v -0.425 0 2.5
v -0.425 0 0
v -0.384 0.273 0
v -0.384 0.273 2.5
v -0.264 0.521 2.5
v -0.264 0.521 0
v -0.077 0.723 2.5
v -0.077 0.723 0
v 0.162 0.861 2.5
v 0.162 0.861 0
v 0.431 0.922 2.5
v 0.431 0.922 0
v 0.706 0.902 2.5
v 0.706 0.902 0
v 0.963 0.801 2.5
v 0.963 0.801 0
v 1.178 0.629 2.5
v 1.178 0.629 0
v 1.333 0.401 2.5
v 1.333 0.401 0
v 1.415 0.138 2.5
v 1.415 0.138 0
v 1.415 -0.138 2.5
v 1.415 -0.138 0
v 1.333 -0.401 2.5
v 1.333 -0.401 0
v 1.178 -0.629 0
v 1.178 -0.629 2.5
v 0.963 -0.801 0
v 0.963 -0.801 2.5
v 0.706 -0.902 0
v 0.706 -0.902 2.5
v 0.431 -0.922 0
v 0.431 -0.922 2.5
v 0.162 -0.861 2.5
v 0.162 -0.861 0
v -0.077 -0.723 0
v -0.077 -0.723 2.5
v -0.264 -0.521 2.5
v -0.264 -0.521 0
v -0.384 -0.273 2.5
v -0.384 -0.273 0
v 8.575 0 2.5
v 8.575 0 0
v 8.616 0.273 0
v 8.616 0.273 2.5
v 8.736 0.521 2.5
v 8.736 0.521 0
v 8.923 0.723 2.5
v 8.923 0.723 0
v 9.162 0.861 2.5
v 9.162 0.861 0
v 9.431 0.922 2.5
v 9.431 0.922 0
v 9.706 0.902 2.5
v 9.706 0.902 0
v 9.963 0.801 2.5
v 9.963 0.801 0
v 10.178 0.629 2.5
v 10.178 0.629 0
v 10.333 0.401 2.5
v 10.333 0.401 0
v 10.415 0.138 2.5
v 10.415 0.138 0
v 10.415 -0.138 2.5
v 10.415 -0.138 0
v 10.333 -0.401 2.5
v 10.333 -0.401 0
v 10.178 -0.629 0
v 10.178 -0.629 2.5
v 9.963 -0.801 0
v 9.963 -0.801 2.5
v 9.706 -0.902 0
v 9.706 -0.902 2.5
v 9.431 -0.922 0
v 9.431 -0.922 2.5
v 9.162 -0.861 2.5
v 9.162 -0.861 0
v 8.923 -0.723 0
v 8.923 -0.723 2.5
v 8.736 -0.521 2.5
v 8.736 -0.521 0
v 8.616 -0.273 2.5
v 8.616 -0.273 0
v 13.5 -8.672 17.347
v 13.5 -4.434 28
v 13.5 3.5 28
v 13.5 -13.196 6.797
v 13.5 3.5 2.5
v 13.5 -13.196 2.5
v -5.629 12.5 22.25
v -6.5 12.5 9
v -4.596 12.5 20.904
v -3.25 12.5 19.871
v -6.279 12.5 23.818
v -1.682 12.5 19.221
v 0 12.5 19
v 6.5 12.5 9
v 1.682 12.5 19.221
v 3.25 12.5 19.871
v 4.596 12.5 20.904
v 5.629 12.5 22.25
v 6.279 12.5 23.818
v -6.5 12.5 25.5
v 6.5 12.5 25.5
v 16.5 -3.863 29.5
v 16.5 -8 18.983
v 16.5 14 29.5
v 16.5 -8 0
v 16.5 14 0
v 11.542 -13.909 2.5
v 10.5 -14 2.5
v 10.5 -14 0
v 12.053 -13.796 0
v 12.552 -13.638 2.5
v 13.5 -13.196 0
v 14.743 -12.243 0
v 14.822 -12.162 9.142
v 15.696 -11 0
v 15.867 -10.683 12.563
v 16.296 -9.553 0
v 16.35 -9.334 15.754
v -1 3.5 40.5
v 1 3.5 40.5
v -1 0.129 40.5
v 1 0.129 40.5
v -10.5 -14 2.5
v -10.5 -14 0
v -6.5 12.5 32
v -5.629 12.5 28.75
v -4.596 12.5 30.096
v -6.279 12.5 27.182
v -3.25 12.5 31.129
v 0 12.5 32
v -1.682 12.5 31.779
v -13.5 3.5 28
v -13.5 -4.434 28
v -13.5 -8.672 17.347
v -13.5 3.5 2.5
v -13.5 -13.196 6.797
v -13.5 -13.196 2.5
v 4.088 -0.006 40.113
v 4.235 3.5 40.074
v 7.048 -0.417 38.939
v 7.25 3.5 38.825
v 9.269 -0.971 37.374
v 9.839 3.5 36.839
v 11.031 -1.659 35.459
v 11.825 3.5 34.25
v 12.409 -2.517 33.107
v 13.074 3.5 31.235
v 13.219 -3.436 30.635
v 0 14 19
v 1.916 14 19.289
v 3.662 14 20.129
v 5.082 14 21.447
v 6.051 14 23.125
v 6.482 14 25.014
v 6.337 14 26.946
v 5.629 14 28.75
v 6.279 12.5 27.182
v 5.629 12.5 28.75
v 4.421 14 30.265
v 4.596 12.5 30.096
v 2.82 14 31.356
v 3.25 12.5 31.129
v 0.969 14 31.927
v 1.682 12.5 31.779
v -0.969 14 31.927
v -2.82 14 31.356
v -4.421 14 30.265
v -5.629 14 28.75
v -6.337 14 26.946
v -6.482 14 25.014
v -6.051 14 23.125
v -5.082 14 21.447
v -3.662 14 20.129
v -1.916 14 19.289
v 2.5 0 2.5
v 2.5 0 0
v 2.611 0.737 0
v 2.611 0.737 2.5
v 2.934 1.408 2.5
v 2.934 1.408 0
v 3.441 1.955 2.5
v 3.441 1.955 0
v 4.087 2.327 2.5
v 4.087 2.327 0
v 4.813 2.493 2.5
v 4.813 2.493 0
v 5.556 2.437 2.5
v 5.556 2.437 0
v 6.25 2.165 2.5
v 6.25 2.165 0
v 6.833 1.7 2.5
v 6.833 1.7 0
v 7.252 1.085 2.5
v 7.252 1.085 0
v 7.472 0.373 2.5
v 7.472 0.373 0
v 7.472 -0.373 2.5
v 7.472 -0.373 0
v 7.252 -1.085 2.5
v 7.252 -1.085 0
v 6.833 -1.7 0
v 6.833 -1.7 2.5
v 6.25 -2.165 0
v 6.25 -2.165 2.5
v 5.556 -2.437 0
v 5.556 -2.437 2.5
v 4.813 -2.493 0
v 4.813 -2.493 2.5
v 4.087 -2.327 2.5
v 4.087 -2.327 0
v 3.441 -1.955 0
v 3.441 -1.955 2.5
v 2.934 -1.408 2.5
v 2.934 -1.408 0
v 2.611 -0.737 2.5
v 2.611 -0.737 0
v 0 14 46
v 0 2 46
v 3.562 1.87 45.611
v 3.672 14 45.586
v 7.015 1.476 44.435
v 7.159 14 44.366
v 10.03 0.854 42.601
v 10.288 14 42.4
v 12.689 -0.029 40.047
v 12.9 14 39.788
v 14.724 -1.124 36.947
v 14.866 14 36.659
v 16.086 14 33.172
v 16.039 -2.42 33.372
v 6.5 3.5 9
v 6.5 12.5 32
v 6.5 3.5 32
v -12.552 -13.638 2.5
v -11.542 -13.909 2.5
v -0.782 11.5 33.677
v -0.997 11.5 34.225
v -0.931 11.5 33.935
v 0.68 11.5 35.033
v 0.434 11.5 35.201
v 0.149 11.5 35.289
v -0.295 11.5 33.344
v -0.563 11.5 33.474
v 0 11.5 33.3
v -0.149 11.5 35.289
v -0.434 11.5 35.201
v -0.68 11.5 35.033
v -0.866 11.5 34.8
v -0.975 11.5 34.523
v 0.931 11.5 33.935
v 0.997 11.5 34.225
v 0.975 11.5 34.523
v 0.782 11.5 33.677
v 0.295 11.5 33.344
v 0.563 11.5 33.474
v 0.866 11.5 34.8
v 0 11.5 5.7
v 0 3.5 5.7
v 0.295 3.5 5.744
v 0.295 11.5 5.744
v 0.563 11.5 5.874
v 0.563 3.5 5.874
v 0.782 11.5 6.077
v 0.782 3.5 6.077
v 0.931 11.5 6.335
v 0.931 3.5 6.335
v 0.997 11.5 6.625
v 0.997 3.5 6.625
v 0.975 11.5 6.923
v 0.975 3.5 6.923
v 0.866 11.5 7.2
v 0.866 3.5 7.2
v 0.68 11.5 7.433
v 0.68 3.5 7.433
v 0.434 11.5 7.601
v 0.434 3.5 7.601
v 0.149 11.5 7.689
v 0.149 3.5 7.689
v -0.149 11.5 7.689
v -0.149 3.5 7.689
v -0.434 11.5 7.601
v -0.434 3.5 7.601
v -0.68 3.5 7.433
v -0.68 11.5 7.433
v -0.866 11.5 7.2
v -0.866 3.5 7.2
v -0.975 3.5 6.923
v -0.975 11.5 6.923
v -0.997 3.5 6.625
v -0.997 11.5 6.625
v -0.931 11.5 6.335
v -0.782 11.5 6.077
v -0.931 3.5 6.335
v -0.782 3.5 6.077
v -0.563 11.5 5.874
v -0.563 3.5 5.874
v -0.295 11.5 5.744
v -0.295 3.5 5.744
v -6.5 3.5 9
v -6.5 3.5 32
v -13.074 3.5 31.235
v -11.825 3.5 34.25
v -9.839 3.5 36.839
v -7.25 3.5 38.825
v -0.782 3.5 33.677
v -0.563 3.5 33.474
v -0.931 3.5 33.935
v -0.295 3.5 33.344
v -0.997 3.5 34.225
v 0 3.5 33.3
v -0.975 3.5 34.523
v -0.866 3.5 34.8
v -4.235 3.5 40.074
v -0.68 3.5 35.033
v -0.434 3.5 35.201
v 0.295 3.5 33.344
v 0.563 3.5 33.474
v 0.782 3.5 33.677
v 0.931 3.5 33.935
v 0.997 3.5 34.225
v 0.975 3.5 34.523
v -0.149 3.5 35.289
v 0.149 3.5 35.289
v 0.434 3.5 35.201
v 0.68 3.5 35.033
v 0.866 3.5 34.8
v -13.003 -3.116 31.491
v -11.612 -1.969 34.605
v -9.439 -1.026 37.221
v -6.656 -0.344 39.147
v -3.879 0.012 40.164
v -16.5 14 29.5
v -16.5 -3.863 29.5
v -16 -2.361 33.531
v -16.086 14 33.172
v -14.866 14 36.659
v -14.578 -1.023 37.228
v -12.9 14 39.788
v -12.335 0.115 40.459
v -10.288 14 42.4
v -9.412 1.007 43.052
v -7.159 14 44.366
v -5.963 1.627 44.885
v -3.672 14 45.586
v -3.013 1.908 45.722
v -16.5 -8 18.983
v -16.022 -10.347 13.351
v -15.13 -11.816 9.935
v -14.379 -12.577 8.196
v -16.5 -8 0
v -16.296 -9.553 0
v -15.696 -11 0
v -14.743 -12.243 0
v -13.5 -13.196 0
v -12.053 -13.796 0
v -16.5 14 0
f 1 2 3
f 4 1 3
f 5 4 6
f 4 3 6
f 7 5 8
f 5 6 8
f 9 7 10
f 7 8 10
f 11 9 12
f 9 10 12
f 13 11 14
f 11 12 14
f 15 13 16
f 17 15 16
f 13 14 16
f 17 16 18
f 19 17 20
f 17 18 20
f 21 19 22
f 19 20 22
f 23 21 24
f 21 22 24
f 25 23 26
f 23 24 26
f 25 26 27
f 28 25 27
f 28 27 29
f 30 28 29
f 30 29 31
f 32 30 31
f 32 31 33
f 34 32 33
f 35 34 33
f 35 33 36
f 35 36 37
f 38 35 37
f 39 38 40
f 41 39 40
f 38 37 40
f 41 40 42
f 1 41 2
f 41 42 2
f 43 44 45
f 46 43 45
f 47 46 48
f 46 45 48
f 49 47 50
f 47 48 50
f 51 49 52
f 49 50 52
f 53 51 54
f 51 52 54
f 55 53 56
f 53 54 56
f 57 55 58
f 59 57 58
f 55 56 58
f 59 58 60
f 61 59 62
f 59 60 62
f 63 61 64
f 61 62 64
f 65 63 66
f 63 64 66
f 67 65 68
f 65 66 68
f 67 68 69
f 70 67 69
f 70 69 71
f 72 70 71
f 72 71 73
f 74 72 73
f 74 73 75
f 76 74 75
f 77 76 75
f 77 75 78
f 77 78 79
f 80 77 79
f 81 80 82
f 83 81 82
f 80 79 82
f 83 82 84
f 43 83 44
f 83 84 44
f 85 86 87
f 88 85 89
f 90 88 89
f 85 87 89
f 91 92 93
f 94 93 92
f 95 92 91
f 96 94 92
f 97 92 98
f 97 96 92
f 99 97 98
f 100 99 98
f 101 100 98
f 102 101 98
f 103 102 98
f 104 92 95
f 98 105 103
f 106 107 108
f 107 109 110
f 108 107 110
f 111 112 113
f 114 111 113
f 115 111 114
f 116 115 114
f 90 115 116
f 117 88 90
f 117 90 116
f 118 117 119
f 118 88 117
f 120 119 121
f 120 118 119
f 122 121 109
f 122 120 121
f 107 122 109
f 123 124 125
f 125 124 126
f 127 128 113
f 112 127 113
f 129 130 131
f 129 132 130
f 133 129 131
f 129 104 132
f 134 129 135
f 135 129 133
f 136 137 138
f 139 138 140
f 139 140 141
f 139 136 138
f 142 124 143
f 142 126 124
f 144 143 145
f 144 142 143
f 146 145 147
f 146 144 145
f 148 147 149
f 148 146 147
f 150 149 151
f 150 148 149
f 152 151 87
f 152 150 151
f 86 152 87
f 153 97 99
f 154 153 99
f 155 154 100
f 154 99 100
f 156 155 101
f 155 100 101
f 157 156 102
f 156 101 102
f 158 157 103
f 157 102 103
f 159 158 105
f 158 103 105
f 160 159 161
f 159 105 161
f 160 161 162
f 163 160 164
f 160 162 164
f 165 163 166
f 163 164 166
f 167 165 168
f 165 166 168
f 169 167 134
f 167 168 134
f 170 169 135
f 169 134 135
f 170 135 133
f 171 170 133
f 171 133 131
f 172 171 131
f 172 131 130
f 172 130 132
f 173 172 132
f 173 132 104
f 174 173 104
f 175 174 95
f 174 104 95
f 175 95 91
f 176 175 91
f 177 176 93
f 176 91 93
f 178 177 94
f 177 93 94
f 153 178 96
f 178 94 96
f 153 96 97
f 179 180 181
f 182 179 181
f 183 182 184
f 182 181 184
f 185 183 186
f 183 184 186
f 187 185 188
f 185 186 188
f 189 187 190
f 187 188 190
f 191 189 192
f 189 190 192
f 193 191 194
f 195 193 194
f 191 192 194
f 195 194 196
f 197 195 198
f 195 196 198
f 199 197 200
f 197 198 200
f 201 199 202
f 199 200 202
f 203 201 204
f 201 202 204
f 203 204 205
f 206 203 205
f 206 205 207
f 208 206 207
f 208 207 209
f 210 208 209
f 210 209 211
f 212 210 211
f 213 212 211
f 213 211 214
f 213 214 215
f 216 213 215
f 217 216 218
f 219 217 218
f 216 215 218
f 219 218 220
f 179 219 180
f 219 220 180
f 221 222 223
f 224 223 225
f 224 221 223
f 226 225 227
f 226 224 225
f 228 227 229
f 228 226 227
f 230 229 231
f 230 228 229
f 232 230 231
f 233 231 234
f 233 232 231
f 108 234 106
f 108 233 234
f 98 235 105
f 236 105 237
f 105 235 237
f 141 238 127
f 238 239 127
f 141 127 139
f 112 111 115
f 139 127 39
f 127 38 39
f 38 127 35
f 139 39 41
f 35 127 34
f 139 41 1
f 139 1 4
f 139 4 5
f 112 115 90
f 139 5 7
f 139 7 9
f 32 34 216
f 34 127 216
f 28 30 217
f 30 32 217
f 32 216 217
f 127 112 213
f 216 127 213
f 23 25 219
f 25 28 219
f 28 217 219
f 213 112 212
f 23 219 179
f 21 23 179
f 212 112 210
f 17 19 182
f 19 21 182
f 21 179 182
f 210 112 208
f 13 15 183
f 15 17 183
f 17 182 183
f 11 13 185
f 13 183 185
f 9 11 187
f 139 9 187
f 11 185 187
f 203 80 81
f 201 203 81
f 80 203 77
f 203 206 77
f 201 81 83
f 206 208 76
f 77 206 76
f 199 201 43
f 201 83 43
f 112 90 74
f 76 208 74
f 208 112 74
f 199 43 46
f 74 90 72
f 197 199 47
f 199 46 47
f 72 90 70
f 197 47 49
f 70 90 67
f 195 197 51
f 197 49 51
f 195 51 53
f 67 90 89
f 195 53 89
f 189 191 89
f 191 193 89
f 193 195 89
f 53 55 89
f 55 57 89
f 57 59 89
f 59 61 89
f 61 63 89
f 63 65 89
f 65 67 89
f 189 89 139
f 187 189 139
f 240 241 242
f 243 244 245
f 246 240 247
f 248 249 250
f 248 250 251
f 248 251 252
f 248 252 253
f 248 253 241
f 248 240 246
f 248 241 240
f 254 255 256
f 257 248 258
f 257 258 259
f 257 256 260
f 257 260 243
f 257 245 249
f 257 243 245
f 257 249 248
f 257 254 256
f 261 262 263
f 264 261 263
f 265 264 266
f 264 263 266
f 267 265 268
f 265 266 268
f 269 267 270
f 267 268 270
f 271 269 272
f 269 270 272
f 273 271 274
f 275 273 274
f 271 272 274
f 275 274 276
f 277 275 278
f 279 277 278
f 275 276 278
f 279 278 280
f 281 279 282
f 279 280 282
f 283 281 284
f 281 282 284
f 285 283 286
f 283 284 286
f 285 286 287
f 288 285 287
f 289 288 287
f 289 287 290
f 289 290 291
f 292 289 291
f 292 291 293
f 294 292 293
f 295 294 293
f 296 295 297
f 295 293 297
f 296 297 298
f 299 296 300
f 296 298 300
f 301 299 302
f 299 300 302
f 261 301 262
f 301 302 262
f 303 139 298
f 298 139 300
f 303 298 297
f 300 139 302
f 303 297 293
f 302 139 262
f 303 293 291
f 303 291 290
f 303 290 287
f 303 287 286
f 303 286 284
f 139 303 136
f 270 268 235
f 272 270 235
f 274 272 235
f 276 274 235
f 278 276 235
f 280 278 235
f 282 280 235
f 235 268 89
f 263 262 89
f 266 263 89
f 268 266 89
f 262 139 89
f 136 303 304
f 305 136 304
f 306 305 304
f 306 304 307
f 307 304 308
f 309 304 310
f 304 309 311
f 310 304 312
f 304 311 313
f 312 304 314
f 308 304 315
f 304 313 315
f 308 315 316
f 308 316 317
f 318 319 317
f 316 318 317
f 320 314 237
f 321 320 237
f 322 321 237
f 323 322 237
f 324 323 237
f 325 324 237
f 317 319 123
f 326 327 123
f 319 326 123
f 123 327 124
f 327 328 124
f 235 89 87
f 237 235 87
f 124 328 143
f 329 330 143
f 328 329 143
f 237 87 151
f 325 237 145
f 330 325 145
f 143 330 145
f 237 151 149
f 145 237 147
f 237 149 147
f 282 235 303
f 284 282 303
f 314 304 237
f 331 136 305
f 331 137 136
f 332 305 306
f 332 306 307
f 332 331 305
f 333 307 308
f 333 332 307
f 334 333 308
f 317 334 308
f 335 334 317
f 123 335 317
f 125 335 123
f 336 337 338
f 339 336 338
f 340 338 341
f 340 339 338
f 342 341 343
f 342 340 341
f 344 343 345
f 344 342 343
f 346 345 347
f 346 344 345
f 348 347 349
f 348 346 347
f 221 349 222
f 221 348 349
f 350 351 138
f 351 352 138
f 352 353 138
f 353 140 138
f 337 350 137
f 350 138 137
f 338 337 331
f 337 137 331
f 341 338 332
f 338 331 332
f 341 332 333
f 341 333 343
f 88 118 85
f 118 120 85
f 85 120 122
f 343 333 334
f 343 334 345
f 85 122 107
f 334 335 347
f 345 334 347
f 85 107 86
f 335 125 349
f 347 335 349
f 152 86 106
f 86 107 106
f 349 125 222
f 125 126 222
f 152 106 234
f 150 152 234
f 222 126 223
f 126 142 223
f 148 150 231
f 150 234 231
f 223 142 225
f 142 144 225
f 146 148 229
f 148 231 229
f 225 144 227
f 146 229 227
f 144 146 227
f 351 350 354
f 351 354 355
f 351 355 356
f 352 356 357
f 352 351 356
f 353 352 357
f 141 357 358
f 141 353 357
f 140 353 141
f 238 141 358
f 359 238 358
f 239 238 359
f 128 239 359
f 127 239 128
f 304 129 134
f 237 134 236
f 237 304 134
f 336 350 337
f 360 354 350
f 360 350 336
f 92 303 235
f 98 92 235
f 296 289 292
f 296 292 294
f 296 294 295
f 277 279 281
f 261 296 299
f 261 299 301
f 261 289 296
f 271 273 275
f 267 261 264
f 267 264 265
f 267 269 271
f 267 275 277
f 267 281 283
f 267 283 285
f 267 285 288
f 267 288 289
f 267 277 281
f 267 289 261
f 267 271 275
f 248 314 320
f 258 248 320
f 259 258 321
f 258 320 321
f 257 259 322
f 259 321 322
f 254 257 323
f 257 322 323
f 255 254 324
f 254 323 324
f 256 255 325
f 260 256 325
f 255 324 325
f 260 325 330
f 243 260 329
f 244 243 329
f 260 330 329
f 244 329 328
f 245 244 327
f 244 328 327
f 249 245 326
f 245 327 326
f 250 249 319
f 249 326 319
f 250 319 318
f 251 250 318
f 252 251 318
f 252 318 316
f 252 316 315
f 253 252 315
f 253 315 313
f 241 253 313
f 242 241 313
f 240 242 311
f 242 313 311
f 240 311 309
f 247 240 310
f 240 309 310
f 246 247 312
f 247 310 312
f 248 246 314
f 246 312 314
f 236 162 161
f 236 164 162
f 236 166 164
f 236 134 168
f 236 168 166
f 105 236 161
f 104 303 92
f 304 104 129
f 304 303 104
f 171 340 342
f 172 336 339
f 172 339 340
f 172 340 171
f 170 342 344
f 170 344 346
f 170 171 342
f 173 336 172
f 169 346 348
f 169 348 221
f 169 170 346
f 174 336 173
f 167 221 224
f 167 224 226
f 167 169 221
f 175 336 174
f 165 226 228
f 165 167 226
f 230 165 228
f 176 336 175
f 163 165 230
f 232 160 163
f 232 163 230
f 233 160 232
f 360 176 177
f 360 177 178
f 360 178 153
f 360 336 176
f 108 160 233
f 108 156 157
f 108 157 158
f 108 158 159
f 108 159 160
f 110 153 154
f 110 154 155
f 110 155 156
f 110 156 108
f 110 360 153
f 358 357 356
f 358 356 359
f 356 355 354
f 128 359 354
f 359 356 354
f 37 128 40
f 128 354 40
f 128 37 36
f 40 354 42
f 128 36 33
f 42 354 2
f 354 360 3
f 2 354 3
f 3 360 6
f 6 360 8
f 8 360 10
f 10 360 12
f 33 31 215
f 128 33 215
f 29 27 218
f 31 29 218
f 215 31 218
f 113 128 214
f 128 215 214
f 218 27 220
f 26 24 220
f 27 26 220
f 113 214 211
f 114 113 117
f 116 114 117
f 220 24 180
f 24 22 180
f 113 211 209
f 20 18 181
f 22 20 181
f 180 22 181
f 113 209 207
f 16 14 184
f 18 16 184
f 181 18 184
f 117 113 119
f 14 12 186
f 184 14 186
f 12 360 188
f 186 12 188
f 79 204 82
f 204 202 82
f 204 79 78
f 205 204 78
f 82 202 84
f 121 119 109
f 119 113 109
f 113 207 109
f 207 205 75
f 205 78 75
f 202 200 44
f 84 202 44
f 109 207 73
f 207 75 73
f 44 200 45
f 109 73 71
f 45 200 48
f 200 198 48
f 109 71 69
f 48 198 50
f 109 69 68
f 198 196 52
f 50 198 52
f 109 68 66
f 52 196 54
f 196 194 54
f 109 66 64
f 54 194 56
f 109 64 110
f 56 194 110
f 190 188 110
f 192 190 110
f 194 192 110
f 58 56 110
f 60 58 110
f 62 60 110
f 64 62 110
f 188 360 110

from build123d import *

# Parameters (mm, degrees)
SKETCH1_W           = 33
SKETCH1_H           = 28
BOSS_EXTRUDE1_DEPTH = 46
CUT_EXTRUDE1_DEPTH  = 59.318093247
CUT_EXTRUDE4_START  = -3
CUT_EXTRUDE4_DEPTH  = 27
FILLET1_R           = 12.5
FILLET2_R           = 16.5
FILLET3_R           = 6
SKETCH5_W           = 13
SKETCH5_H           = 23
CUT_EXTRUDE8_DEPTH  = 9
SKETCH6_R           = 6.5
CUT_EXTRUDE9_DEPTH  = 56.592265809
SKETCH7_R           = 1
CUT_EXTRUDE10_DEPTH = 8
SKETCH8_R           = 0.925072744
SKETCH8_R_2         = 2.5
CUT_EXTRUDE11_DEPTH = 2.5


with BuildPart() as part:
    # Sketch1 → Boss-Extrude1 (new body)
    with BuildSketch(Plane.XY):
        Rectangle(SKETCH1_W, SKETCH1_H)
    extrude(amount=BOSS_EXTRUDE1_DEPTH)

    # Sketch3 → Cut-Extrude1 (cut, through all)
    with BuildSketch(Plane(origin=(16.5, 0, 0), x_dir=(0, 0, -1), z_dir=(1, 0, 0))):
        with BuildLine():
            Line((-46, 2), (-46, -14))
            Line((-46, -14), (-5, -14))
            add(Edge.make_bspline(
                [(-5, -14), (-25.11965555, -4.947029267), (-46, 2)],
                knots=[0, 0, 0, 1, 1, 1], degree=2))
        make_face()
    extrude(amount=-CUT_EXTRUDE1_DEPTH, mode=Mode.SUBTRACT)

    # Sketch4 → Cut-Extrude4 (cut)
    with BuildSketch(Plane(origin=(16.5, 0, 0), x_dir=(0, 0, -1), z_dir=(1, 0, 0)).offset(CUT_EXTRUDE4_START)):
        with BuildLine():
            Line((-5, -14), (-2.5, -14))
            Line((-2.5, -14), (-2.5, 3.5))
            Line((-2.5, 3.5), (-40.5, 3.5))
            Line((-40.5, 3.5), (-40.5, 0.128997137))
            add(Edge.make_bspline(
                [(-5, -14), (-22.463452761, -6.142205101), (-40.5, 0.128997137)],
                knots=[0, 0, 0, 1, 1, 1], degree=2))
        make_face()
    extrude(amount=-CUT_EXTRUDE4_DEPTH, mode=Mode.SUBTRACT)

    # Fillet1
    fillet1_edges = [part.edges().sort_by_distance(p)[0] for p in [
        (13.5, 1.814498569, 40.5),
        (-13.5, 1.814498569, 40.5),
    ]]
    fillet(fillet1_edges, radius=FILLET1_R)

    # Fillet2
    fillet2_edges = [part.edges().sort_by_distance(p)[0] for p in [
        (-16.5, 8, 46),
        (16.5, 8, 46),
    ]]
    fillet(fillet2_edges, radius=FILLET2_R - 0.0001)  # a hair under: the kernel refuses the full size

    # Fillet3
    fillet3_edges = [part.edges().sort_by_distance(p)[0] for p in [
        (-16.5, -14, 2.5),
        (16.5, -14, 2.5),
    ]]
    fillet(fillet3_edges, radius=FILLET3_R)

    # Sketch5 → Cut-Extrude8 (cut)
    with BuildSketch(Plane.XZ.offset(-3.5)):
        with Locations((0, 20.5)):
            Rectangle(SKETCH5_W, SKETCH5_H)
    extrude(amount=-CUT_EXTRUDE8_DEPTH, mode=Mode.SUBTRACT)

    # Sketch6 → Cut-Extrude9 (cut, through all)
    with BuildSketch(Plane.XZ.offset(-12.5)):
        with Locations(Location((0, 25.5, 0), (0, 0, 270))):
            Circle(SKETCH6_R)
    extrude(amount=-CUT_EXTRUDE9_DEPTH, mode=Mode.SUBTRACT)

    # Sketch7 → Cut-Extrude10 (cut)
    with BuildSketch(Plane.XZ.offset(-3.5)):
        with Locations(Location((0, 34.3, 0), (0, 0, 270))):
            Circle(SKETCH7_R)
        with Locations(Location((0, 6.7, 0), (0, 0, 270))):
            Circle(SKETCH7_R)
    extrude(amount=-CUT_EXTRUDE10_DEPTH, mode=Mode.SUBTRACT)

    # Sketch8 → Cut-Extrude11 (cut)
    with BuildSketch(Plane(origin=(0, 0, 0), x_dir=(-1, 0, 0), z_dir=(0, 0, -1))):
        with Locations((-9.5, 0)):
            Circle(SKETCH8_R)
        with Locations((-5, 0)):
            Circle(SKETCH8_R_2)
        with Locations((-0.5, 0)):
            Circle(SKETCH8_R)
    extrude(amount=-CUT_EXTRUDE11_DEPTH, mode=Mode.SUBTRACT)


solid = part.part
